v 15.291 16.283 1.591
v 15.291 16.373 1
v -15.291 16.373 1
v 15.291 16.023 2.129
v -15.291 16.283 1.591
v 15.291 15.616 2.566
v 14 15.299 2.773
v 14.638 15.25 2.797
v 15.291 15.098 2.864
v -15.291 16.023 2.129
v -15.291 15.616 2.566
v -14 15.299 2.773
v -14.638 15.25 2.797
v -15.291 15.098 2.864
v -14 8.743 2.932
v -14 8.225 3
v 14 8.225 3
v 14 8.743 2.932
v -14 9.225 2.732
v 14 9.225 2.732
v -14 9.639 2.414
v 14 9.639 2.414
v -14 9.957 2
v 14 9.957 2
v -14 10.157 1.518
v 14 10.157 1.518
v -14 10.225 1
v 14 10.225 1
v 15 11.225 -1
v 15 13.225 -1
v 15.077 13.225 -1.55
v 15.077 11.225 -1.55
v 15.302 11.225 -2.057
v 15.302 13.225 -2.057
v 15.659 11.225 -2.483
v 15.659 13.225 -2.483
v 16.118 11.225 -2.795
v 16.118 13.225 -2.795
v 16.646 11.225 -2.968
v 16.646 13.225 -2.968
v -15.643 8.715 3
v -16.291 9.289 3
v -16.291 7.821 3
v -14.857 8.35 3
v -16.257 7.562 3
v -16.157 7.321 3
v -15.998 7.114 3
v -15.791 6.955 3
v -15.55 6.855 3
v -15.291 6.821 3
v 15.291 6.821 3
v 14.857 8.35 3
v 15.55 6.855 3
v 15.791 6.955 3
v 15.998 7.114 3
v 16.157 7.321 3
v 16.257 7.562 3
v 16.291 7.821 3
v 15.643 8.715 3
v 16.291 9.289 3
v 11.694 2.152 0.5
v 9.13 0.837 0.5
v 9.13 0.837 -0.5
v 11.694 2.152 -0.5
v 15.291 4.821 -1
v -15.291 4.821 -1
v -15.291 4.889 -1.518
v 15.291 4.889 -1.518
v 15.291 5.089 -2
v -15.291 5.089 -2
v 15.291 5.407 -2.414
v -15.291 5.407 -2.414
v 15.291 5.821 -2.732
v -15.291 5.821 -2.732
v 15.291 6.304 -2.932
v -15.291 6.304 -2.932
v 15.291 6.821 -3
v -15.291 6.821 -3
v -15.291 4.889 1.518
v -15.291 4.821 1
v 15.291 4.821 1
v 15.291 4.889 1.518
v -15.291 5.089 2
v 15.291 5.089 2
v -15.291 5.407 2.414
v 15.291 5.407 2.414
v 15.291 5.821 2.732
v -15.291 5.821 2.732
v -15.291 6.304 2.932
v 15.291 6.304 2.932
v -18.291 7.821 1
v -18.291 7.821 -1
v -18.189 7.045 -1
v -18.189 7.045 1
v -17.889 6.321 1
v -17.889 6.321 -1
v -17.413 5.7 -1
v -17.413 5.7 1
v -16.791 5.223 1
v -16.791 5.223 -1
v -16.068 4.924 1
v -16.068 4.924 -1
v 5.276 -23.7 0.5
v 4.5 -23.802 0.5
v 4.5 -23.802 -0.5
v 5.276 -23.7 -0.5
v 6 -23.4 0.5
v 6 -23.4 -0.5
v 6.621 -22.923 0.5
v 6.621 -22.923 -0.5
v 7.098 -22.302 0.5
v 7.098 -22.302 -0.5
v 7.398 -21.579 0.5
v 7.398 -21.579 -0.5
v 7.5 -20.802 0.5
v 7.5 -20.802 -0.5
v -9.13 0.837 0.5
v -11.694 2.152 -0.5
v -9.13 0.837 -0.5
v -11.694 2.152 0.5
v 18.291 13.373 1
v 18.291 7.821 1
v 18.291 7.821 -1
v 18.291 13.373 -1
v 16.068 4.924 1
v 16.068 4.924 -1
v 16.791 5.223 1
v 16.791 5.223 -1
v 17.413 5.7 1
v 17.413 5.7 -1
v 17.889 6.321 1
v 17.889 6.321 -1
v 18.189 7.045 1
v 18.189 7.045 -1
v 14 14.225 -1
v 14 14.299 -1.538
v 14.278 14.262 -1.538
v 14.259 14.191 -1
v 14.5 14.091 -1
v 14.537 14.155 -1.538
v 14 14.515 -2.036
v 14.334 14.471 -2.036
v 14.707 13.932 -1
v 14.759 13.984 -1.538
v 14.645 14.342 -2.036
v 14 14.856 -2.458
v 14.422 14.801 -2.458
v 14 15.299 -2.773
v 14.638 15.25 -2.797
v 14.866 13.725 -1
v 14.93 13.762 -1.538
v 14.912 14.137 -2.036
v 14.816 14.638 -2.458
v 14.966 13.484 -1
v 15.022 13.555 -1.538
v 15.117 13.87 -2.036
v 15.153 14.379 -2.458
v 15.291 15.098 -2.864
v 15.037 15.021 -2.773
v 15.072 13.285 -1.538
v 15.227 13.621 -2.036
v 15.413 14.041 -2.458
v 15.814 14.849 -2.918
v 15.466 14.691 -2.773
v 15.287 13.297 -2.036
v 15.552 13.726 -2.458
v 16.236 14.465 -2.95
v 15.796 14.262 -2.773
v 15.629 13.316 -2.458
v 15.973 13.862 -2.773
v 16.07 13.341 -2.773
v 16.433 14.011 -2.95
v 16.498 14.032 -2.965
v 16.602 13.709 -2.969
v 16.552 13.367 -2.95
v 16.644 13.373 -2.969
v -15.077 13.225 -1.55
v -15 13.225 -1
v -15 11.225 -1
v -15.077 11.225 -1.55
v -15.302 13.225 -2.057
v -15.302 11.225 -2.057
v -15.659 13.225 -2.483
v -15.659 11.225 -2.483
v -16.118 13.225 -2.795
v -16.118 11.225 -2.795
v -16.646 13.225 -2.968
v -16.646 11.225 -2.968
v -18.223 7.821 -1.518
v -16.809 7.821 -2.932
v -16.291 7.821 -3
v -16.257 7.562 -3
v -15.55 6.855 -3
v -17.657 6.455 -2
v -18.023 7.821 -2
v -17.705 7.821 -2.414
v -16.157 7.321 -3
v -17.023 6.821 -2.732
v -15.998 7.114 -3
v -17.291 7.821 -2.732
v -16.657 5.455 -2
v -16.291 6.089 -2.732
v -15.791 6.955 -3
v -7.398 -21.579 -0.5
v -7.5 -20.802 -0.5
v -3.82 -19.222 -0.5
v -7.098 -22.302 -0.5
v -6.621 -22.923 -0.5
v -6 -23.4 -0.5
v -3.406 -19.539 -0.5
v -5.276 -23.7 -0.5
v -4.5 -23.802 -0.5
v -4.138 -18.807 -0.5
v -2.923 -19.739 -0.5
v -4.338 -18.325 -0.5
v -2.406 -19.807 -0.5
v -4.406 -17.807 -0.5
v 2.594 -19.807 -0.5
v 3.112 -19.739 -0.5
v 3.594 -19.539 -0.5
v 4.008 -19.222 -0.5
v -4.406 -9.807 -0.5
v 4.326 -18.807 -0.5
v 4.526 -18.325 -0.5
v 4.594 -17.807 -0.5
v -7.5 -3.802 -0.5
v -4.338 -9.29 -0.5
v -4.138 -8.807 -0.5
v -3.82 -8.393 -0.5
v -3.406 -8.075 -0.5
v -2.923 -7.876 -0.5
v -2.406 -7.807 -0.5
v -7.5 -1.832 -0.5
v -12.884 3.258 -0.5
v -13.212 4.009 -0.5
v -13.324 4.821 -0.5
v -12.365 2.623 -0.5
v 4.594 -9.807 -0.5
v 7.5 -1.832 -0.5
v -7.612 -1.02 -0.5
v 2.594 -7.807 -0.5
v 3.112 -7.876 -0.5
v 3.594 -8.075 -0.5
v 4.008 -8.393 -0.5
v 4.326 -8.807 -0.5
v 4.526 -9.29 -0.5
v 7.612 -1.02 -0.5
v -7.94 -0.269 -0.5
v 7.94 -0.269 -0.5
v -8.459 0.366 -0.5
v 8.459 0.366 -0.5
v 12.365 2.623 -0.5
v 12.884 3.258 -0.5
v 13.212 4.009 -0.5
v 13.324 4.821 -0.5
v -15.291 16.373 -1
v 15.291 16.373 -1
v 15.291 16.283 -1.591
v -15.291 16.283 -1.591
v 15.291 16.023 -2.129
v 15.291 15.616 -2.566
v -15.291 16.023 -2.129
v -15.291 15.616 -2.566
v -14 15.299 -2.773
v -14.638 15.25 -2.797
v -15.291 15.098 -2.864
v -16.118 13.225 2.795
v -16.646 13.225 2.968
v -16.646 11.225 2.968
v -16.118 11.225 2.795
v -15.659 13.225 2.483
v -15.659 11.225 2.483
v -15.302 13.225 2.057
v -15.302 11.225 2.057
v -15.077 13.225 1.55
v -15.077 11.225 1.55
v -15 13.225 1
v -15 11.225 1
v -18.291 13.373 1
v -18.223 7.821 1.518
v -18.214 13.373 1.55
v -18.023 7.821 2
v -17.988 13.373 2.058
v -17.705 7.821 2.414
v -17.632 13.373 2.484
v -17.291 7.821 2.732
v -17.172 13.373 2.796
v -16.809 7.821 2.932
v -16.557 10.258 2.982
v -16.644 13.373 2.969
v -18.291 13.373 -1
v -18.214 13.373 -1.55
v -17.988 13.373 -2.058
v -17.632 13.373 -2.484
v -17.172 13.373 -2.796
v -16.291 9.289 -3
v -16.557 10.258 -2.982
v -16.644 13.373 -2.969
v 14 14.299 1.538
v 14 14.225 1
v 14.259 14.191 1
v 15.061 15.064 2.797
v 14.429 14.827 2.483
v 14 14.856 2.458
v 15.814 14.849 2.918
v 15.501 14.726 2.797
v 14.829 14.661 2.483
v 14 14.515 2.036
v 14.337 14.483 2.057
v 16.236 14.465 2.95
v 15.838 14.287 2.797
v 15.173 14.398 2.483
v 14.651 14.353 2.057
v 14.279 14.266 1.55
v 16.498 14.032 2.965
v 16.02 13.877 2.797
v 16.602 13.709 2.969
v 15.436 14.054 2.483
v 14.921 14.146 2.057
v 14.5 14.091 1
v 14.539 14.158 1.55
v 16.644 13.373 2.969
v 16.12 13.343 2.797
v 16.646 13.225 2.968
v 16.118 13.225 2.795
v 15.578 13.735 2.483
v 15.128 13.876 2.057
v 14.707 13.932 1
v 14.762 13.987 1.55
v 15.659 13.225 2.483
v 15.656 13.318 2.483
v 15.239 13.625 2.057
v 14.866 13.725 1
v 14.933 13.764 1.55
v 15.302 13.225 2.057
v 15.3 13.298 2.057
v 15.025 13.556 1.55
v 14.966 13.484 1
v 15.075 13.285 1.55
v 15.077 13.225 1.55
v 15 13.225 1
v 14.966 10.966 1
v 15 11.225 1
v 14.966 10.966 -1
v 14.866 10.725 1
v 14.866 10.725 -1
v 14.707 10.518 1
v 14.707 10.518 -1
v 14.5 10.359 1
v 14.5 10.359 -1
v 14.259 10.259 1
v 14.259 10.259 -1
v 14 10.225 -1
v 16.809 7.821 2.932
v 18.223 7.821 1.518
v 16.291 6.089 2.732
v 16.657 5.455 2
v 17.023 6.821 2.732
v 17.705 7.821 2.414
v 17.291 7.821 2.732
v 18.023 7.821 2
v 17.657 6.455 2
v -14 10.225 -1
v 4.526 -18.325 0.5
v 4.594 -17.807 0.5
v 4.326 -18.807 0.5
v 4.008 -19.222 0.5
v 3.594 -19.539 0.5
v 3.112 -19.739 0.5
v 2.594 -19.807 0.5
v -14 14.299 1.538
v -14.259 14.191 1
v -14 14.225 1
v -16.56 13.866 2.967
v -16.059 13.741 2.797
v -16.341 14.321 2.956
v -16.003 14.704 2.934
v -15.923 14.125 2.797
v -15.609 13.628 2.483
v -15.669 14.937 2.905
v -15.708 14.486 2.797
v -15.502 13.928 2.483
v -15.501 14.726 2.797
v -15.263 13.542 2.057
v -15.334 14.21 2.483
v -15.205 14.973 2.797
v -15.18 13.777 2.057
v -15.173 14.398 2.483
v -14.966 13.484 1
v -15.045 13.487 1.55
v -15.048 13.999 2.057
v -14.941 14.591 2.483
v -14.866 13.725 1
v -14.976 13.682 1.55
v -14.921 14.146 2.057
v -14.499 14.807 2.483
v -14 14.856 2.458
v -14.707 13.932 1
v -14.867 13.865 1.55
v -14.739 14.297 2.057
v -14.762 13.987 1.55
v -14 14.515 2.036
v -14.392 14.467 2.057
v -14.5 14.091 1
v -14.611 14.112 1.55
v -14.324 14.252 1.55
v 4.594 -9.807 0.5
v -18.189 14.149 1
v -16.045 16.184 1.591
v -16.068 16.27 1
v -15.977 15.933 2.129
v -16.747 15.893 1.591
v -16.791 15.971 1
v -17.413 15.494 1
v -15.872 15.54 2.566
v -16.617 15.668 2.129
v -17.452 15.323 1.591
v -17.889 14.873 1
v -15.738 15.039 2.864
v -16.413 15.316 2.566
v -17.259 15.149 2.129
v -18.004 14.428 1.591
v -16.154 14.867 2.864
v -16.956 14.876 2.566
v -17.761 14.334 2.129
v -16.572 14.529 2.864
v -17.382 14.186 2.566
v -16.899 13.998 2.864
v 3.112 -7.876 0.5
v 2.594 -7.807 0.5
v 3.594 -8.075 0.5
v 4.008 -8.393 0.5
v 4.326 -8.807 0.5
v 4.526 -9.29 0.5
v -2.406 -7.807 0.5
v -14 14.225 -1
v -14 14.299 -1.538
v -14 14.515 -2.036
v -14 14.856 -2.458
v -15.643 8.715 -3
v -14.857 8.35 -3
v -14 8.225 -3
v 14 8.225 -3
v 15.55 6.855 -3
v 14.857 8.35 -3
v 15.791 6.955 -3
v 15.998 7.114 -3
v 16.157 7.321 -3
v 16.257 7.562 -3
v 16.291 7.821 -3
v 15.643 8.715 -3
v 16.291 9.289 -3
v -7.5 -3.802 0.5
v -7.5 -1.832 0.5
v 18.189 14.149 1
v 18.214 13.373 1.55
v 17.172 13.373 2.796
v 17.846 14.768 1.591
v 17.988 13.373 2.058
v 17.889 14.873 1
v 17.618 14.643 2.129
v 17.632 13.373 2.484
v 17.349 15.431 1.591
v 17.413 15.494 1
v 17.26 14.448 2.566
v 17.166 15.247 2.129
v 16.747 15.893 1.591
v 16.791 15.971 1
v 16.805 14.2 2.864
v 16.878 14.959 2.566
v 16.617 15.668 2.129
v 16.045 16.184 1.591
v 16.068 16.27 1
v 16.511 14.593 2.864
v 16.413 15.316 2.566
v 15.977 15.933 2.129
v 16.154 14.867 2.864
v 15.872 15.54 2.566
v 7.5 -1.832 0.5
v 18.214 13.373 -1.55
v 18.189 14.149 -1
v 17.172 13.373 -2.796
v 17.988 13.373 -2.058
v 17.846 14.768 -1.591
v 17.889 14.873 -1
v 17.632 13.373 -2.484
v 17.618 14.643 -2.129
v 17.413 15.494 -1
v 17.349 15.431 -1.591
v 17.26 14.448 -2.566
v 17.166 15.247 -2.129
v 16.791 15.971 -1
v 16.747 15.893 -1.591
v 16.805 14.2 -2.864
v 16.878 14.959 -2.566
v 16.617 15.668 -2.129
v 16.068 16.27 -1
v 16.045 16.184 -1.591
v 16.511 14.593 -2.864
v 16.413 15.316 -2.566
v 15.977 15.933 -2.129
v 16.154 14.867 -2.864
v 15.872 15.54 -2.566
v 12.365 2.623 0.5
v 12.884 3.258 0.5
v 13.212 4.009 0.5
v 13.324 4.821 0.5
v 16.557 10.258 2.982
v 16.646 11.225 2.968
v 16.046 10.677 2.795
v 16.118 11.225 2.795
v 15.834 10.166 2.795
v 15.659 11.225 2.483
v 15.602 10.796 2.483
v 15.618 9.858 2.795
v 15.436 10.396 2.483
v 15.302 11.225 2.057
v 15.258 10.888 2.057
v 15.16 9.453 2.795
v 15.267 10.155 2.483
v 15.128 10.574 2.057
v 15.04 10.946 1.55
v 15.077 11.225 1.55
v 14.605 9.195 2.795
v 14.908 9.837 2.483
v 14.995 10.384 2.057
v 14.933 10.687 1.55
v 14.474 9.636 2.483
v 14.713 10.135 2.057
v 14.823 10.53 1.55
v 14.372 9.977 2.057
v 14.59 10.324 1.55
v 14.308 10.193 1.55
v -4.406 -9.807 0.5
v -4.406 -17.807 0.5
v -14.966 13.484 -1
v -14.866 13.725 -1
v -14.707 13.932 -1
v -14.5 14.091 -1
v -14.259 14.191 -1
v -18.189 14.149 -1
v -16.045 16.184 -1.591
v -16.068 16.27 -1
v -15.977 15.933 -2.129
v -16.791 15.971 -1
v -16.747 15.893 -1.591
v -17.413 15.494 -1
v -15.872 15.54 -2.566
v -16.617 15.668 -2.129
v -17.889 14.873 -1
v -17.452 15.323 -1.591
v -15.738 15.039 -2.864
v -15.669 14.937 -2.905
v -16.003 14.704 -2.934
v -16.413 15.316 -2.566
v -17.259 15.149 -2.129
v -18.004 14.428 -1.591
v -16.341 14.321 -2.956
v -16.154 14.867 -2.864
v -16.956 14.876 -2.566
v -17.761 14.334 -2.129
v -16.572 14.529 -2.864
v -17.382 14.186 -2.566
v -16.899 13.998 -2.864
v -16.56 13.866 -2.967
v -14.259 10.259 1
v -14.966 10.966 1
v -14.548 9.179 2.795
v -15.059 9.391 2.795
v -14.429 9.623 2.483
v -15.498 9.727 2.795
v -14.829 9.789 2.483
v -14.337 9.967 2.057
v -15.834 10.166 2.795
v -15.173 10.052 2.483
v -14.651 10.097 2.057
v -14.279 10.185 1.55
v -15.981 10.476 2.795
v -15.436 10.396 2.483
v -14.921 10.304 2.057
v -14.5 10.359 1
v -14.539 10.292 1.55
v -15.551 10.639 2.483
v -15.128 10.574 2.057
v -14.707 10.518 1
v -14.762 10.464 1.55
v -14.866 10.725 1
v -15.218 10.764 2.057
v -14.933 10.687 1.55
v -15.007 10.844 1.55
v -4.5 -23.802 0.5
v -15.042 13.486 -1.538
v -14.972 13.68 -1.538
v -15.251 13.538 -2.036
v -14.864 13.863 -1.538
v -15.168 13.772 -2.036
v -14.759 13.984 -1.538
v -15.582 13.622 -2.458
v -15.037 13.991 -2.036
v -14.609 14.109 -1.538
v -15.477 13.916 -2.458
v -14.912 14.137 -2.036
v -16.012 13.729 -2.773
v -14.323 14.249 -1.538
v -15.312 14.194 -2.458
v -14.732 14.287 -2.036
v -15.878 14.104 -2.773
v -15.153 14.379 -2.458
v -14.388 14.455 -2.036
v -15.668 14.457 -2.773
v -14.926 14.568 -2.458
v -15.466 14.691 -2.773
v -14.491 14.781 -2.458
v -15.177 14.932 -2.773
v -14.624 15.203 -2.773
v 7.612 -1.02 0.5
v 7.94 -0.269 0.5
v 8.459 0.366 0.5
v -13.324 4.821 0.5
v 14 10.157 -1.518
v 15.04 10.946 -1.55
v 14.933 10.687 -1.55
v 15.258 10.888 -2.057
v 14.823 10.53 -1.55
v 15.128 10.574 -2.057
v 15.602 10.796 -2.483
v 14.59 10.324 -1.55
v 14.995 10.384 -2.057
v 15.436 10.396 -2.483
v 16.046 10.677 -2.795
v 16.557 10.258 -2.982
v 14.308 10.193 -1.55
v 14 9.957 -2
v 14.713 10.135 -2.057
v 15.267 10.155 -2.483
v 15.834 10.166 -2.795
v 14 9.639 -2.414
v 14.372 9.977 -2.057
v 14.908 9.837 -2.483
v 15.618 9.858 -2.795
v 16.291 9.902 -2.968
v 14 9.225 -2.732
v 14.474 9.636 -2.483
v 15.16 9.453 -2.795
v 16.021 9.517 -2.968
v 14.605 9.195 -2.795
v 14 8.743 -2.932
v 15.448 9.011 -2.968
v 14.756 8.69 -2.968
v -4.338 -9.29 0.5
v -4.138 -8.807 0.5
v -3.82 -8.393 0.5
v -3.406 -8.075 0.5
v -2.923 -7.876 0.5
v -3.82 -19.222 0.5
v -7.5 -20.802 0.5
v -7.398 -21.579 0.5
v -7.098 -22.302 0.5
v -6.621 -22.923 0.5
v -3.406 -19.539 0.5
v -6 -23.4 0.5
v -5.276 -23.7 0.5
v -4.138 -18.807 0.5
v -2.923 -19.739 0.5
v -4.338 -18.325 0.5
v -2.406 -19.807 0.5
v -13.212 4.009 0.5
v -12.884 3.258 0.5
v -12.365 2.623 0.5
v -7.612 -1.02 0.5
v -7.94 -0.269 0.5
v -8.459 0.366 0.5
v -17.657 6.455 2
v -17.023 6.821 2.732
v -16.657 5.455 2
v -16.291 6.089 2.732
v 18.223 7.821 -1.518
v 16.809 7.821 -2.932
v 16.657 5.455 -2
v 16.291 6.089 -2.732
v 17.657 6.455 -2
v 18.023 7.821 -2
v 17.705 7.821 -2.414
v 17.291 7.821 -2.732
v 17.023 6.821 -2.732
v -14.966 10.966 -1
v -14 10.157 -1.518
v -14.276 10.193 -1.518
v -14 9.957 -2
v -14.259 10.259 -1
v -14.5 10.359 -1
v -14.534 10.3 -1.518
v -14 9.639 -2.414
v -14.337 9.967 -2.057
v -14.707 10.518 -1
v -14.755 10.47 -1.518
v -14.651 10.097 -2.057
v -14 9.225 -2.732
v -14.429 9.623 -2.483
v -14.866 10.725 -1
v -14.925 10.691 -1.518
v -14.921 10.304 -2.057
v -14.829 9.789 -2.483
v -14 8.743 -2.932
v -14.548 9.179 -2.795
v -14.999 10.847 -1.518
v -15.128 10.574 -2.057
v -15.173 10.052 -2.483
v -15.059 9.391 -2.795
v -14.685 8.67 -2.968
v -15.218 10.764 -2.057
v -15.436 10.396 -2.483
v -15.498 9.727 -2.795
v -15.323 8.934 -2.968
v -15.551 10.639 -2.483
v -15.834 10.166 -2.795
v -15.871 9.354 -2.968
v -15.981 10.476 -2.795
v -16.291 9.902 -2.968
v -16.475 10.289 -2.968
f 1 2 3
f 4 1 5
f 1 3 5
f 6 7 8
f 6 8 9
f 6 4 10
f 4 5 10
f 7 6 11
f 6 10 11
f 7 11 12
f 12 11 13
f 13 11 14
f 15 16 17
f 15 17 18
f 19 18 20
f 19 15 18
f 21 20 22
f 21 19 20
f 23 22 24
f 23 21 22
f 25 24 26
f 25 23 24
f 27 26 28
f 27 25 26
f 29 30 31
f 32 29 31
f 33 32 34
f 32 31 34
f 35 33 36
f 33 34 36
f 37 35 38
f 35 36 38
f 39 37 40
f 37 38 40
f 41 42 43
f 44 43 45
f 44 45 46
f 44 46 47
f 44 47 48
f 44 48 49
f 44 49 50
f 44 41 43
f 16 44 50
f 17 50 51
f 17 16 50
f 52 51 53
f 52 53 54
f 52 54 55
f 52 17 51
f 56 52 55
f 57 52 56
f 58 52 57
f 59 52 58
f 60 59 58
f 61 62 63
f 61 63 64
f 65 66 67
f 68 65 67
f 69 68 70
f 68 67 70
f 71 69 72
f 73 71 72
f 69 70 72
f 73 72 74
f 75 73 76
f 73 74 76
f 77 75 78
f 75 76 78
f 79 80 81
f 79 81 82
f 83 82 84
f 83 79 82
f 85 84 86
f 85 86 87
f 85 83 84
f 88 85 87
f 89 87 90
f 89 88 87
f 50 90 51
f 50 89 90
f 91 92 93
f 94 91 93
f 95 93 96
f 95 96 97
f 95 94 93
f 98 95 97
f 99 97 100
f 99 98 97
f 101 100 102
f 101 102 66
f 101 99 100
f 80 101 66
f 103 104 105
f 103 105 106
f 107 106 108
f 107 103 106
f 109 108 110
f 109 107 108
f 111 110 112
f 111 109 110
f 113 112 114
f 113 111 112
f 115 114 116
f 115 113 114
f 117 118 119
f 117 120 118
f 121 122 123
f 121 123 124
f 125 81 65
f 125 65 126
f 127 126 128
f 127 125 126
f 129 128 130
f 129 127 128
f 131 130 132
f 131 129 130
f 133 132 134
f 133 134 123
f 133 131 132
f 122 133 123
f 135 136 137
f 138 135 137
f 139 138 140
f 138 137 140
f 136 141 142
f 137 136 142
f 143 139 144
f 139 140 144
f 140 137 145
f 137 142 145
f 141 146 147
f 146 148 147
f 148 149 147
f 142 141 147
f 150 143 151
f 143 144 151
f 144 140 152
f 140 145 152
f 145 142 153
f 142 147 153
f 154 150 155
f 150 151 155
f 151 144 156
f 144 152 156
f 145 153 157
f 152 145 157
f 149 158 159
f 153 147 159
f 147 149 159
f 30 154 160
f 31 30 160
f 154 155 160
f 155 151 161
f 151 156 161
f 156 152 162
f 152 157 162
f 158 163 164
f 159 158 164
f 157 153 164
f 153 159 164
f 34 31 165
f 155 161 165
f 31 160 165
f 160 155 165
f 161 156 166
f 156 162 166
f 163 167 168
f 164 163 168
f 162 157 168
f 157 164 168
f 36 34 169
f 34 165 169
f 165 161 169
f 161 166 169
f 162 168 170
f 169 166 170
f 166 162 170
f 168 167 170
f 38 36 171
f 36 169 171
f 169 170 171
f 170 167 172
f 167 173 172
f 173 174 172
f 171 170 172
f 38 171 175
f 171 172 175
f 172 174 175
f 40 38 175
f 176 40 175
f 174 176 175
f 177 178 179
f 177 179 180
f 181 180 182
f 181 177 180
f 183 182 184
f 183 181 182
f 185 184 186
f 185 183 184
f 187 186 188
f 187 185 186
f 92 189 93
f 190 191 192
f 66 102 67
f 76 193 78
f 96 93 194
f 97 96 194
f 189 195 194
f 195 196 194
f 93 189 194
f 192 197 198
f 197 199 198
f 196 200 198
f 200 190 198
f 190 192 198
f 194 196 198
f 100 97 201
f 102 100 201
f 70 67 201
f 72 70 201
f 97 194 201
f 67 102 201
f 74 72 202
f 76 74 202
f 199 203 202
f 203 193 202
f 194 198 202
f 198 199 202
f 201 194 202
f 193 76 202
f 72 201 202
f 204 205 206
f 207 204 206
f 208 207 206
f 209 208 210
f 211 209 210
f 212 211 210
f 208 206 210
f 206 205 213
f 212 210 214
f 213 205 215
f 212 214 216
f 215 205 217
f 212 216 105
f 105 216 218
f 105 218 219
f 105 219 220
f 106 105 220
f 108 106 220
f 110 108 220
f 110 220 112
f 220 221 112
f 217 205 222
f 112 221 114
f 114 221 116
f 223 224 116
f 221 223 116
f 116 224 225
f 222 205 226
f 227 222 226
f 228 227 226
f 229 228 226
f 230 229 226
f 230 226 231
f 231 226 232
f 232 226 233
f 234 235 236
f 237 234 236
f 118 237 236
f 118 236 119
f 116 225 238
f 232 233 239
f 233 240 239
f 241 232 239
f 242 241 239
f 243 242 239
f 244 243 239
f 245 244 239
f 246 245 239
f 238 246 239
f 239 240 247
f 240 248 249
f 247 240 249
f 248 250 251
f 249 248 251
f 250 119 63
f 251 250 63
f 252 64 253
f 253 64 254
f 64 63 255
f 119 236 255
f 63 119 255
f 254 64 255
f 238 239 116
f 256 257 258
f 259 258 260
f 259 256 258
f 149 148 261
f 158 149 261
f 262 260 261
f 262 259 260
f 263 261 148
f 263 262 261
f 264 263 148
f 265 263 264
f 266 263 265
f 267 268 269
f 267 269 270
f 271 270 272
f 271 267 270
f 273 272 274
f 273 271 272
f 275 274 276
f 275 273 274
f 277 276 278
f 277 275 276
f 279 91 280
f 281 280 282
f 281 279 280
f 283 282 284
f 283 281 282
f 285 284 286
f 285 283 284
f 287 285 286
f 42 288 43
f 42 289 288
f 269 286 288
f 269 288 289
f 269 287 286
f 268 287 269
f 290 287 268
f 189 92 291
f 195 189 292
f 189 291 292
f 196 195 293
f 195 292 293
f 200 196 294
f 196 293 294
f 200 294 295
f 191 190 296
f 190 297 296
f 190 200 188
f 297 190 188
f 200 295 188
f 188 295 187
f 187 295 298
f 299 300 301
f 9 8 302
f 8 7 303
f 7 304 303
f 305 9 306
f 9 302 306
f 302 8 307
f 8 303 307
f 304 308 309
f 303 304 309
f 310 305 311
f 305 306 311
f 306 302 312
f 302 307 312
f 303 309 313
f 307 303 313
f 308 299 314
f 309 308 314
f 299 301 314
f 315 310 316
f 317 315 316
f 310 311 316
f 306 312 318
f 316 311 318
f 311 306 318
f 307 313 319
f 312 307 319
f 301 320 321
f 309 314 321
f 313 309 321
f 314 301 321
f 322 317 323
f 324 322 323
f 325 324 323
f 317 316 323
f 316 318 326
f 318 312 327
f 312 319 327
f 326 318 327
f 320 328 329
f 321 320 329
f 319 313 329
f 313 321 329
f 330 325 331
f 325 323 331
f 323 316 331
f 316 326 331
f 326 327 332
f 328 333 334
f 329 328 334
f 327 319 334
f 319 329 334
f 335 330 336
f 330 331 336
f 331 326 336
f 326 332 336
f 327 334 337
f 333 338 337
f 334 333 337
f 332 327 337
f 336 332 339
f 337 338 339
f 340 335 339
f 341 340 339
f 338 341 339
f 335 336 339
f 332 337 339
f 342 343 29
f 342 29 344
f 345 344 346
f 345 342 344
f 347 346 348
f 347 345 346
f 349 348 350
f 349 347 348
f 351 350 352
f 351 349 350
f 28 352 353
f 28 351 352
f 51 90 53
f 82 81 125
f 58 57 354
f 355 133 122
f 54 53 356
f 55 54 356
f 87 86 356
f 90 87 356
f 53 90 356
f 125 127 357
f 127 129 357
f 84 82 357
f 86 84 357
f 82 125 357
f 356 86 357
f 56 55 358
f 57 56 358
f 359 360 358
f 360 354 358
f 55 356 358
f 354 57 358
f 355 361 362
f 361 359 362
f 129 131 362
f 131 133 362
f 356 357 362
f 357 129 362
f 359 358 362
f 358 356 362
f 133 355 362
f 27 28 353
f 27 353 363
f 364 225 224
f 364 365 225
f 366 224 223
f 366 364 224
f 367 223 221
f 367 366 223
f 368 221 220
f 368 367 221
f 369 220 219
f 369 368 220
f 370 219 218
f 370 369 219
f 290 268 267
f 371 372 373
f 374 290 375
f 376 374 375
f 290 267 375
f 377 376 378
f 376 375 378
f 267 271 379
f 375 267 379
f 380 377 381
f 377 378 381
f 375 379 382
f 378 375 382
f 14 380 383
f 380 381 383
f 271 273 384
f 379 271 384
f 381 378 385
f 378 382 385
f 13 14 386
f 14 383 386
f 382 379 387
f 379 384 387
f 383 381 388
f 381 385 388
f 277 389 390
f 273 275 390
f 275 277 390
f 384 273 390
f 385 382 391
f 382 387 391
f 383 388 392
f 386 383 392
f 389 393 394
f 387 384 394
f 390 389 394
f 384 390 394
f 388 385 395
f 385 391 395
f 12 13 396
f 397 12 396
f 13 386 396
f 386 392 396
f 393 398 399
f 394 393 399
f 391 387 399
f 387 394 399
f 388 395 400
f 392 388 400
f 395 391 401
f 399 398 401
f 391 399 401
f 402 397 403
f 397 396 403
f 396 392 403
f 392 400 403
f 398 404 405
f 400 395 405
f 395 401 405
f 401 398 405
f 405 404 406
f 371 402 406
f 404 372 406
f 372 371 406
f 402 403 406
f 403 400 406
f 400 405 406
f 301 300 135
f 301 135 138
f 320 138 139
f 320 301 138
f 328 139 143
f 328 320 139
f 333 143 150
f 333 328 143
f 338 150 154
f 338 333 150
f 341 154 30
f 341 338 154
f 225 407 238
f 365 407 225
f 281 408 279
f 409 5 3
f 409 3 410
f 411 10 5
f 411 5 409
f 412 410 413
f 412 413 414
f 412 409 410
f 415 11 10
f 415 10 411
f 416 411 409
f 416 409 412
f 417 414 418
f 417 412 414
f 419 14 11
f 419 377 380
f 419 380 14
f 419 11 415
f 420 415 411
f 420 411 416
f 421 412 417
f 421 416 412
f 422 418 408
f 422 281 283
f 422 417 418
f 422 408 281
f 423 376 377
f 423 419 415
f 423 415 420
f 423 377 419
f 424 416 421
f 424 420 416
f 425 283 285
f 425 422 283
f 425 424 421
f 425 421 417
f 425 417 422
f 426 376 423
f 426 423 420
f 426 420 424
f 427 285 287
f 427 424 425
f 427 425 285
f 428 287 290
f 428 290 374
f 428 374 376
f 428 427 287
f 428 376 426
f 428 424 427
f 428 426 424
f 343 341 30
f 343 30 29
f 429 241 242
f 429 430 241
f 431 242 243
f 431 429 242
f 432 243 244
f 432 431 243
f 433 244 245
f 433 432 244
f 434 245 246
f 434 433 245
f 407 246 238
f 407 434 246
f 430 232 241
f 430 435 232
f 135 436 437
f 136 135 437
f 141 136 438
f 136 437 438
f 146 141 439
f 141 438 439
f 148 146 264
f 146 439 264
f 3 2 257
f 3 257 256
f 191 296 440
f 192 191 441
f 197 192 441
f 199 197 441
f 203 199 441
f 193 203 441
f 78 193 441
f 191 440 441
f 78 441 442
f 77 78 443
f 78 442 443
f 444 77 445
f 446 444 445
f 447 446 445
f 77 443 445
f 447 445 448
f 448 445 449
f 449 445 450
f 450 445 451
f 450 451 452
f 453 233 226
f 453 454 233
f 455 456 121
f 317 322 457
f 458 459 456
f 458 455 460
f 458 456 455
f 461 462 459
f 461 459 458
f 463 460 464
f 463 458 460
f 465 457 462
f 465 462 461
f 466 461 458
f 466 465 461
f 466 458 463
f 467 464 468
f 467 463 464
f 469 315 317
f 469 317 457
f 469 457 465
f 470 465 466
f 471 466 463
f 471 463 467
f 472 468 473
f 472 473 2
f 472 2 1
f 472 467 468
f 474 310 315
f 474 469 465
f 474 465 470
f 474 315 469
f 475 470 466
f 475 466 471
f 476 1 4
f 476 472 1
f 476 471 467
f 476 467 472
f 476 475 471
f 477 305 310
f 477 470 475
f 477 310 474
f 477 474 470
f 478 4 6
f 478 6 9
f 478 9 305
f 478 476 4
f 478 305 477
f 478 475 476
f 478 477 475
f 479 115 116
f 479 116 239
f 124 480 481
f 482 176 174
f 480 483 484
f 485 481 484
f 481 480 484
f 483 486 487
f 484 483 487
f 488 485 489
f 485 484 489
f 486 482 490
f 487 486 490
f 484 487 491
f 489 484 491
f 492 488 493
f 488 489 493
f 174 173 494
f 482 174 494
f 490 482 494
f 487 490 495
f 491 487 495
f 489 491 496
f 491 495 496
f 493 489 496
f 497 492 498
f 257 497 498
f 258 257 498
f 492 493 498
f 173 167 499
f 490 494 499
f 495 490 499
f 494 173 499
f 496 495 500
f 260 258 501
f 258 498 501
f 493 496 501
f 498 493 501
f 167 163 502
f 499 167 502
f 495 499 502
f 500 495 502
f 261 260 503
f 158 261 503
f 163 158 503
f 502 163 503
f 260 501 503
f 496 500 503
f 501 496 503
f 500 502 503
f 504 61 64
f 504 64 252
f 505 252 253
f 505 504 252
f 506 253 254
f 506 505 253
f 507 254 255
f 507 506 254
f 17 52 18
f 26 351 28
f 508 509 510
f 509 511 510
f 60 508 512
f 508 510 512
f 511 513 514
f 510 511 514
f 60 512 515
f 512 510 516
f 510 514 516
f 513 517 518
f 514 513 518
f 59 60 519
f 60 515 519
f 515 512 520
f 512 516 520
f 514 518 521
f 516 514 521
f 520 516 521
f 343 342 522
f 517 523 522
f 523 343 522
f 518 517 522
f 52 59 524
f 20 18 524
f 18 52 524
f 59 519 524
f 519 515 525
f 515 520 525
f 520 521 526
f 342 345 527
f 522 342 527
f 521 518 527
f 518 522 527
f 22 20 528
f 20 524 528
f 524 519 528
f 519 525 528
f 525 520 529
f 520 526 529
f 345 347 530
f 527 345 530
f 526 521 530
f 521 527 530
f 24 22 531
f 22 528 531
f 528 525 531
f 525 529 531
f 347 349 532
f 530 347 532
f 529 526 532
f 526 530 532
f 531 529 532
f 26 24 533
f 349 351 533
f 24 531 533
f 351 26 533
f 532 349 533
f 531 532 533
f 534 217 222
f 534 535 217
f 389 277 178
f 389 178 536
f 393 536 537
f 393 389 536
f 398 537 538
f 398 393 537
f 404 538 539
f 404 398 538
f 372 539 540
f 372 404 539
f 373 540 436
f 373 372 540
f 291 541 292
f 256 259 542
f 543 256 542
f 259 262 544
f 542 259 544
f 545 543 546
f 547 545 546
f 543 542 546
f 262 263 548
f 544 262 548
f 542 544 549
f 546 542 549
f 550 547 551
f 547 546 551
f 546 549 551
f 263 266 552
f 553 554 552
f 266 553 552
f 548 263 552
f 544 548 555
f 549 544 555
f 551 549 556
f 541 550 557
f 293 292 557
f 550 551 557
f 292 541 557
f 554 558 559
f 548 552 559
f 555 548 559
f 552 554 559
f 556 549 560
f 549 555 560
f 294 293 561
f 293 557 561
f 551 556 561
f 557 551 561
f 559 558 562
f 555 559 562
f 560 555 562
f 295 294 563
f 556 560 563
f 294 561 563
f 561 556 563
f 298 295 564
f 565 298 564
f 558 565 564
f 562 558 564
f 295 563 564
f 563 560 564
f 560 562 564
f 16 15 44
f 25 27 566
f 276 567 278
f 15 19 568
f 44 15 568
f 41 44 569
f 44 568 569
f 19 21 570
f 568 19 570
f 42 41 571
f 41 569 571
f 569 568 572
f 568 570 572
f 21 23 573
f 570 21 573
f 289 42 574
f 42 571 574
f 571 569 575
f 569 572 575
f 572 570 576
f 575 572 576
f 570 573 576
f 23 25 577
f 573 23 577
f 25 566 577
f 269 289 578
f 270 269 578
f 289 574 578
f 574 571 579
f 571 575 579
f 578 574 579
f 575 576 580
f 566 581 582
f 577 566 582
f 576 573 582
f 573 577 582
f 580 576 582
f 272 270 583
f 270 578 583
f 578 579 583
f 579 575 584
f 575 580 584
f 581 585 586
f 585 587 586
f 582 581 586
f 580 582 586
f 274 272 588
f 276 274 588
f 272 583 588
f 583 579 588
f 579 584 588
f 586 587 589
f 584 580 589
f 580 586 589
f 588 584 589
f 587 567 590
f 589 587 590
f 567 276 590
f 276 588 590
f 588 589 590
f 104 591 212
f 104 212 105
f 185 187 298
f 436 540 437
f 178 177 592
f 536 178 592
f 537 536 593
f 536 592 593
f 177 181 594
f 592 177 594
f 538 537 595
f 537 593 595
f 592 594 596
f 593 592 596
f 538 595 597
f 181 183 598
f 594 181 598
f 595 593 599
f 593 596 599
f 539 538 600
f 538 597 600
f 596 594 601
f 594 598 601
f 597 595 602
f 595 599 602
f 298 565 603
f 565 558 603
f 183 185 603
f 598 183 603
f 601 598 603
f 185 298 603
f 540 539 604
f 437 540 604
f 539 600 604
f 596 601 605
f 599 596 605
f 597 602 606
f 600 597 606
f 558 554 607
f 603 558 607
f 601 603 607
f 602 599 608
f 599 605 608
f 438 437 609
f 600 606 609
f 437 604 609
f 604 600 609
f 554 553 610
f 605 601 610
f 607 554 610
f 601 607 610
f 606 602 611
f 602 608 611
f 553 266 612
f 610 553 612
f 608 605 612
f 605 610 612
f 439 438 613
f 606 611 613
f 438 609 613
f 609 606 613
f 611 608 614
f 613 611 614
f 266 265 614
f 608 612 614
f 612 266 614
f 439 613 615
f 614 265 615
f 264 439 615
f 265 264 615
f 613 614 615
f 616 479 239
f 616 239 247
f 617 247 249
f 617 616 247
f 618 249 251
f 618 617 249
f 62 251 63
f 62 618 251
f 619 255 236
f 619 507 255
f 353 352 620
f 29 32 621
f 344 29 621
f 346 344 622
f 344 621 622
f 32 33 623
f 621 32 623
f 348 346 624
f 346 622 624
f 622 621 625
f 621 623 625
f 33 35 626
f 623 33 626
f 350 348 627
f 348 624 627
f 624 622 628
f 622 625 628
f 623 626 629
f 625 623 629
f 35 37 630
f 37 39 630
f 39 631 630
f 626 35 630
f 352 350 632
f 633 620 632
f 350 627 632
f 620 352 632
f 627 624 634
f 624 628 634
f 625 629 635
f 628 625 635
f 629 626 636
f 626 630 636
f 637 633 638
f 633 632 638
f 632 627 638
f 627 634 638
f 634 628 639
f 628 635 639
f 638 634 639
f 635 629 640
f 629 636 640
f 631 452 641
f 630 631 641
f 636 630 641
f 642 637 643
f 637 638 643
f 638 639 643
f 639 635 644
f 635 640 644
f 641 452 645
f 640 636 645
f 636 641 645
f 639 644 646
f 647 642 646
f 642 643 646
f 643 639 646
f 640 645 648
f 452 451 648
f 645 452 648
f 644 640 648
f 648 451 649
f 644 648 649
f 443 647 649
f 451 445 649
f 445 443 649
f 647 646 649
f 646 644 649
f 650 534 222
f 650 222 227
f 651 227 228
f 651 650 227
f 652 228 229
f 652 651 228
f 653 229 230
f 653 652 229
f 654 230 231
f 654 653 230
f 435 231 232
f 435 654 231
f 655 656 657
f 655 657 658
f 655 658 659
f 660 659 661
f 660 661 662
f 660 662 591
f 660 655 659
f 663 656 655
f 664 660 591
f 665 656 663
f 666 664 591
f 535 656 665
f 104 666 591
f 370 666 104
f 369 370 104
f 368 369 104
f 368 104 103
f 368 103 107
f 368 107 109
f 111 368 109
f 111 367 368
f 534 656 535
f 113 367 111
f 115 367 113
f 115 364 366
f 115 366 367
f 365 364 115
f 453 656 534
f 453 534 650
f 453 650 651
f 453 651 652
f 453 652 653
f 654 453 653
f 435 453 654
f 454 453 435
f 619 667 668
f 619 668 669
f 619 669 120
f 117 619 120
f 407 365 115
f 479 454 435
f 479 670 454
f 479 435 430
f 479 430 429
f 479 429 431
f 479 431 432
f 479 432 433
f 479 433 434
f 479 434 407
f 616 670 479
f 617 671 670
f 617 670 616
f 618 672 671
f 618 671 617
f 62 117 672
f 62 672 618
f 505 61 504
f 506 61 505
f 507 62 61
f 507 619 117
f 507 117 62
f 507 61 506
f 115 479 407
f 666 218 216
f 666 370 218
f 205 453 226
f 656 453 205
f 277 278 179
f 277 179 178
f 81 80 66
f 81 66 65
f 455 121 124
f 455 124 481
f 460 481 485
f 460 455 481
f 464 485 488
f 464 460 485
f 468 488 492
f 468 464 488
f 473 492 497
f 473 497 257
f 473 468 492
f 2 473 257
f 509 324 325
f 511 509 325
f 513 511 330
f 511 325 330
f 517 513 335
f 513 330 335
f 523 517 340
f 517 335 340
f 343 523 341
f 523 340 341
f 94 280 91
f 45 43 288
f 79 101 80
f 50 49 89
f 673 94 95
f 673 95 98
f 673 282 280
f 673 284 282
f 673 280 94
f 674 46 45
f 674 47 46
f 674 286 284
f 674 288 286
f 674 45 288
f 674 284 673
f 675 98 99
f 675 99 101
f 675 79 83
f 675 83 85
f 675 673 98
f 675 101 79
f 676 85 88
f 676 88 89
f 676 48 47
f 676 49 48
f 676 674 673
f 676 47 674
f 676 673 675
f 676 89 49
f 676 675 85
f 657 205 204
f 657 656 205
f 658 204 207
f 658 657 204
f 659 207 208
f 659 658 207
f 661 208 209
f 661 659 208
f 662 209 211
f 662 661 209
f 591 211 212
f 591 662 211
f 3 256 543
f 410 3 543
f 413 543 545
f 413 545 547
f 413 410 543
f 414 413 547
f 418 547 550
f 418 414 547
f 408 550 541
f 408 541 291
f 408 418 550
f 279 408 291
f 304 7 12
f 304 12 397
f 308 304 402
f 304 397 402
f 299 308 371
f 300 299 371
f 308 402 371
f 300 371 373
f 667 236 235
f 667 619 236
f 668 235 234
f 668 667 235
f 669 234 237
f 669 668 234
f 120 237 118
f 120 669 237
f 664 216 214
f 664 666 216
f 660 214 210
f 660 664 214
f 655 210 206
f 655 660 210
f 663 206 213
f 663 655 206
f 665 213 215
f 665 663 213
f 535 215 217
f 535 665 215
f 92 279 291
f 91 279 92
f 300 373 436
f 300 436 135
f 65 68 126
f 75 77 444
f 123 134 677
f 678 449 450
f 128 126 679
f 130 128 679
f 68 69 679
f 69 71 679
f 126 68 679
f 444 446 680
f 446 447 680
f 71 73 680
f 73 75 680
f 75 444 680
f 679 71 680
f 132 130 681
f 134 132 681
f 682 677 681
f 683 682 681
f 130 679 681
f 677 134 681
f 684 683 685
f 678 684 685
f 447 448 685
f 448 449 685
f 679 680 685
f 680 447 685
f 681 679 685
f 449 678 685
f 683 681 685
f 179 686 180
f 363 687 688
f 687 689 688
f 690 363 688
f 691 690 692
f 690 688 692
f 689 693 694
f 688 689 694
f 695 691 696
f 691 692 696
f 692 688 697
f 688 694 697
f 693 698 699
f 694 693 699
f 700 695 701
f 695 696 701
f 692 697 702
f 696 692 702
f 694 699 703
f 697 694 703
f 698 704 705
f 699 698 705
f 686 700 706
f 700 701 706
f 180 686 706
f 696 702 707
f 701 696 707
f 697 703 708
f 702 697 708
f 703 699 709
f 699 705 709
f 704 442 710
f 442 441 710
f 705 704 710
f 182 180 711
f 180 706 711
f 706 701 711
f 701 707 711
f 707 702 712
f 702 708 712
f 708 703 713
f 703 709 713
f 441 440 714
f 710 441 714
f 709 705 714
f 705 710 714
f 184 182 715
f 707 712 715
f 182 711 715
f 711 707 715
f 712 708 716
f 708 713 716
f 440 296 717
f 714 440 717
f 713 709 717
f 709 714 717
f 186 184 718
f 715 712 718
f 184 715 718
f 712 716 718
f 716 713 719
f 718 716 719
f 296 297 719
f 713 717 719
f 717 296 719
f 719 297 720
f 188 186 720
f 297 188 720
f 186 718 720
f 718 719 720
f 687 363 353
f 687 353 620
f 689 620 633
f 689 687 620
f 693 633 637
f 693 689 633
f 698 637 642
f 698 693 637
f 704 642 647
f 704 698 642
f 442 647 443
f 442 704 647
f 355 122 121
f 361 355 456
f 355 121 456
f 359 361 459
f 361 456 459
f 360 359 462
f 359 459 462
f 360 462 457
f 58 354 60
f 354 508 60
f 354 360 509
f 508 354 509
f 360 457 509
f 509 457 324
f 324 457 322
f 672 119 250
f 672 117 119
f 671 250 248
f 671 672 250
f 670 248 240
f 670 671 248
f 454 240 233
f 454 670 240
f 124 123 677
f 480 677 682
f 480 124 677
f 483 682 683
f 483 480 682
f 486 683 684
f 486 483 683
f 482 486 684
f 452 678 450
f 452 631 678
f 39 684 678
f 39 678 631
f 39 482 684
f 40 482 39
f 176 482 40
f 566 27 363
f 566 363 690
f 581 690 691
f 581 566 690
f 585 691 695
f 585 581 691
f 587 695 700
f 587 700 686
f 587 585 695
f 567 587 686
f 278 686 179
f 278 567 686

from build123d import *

# Parameters (mm, degrees)
F1_DEPTH     = 0.5
F2_DEPTH     = 3
F3_T1_DEPTH  = 30.5823954344
F3_T3_DEPTH  = 28
F3_T5_DEPTH  = 2
F3_T7_DEPTH  = 5.5512716671
F3_T10_ANGLE = 90
F3_T12_ANGLE = 90
F3_T14_ANGLE = 90
F3_T16_ANGLE = 90
F3_T18_ANGLE = 90
F3_T20_ANGLE = 90
F3_T22_ANGLE = 90
F3_T24_ANGLE = 90
F3_T26_ANGLE = 90
F3_T28_ANGLE = 90
F3_T30_ANGLE = 90
F3_T32_ANGLE = 90
F3_T34_ANGLE = 90
F3_T36_ANGLE = 90
F3_T38_ANGLE = 90
F3_T40_ANGLE = 90


# Not quite as in the source:
# - a fillet or chamfer that OpenCascade refuses, or shapes differently, is made with other operations: its cross-section is extruded or revolved along the edge and cut away or added
# - ends of sketch curves that miss each other by under 0.0002 mm in the source are joined


with BuildPart() as f1:
    # F0 (on Top) → F1 (new body, symmetric)
    with BuildSketch(Plane.XY):
        with BuildLine():
            ThreePointArc((-7.5000009313, -20.8021384721), (-6.6213212749, -22.9234588157), (-4.5000009313, -23.8021384721))
            Line((-4.5000009313, -23.8021384721), (4.4999990687, -23.8021384721))
            ThreePointArc((4.4999990687, -23.8021384721), (6.6213194122, -22.9234588157), (7.4999990687, -20.8021384721))
            Line((7.4999990687, -20.8021384721), (7.4999990687, -3.8021384721))
            Line((7.4999990687, -3.8021384721), (7.4999990687, -1.8323950848))
            ThreePointArc((7.4999990687, -1.8323950848), (7.9397973668, -0.2686280799), (9.1302438991, 0.8366442134))
            Line((9.1302438991, 0.8366442134), (11.6938184408, 2.1522747039))
            ThreePointArc((11.6938184408, 2.1522747039), (12.8842649732, 3.2575469972), (13.3240632713, 4.8213140021))
            Line((13.3240632713, 4.8213140021), (0, 4.8213140021))
            Line((0, 4.8213140021), (-13.3240632713, 4.8213140021))
            ThreePointArc((-13.3240632713, 4.8213140021), (-12.8842649732, 3.2575469972), (-11.6938184408, 2.1522747039))
            Line((-11.6938184408, 2.1522747039), (-9.1302438991, 0.8366442134))
            ThreePointArc((-9.1302438991, 0.8366442134), (-7.9397973668, -0.2686280799), (-7.4999990687, -1.8323950848))
            Line((-7.4999990687, -1.8323950848), (-7.4999990687, -3.8021384721))
            Line((-7.4999990687, -3.8021384721), (-7.5000009313, -20.8021384721))
        make_face()
        with BuildLine():
            ThreePointArc((-4.4058463536, -9.8073738366), (-3.820059916, -8.3931602743), (-2.4058463536, -7.8073738366))
            Line((-2.4058463536, -7.8073738366), (2.5941536464, -7.8073738366))
            ThreePointArc((2.5941536464, -7.8073738366), (4.0083672088, -8.3931602743), (4.5941536464, -9.8073738366))
            Line((4.5941536464, -9.8073738366), (4.5941536464, -17.8073738366))
            ThreePointArc((4.5941536464, -17.8073738366), (4.0083672088, -19.221587399), (2.5941536464, -19.8073738366))
            Line((2.5941536464, -19.8073738366), (-2.4058463536, -19.8073738366))
            ThreePointArc((-2.4058463536, -19.8073738366), (-3.820059916, -19.221587399), (-4.4058463536, -17.8073738366))
            Line((-4.4058463536, -17.8073738366), (-4.4058463536, -9.8073738366))
        make_face(mode=Mode.SUBTRACT)
    extrude(amount=F1_DEPTH, both=True)


with BuildPart() as f2:
    # F0 (on Top) → F2 (new body, symmetric)
    with BuildSketch(Plane.XY):
        with BuildLine():
            Line((-15.2911977172, 4.8213140021), (-13.3240632713, 4.8213140021))
            Line((-13.3240632713, 4.8213140021), (0, 4.8213140021))
            Line((0, 4.8213140021), (0, 10.225163497))
            Line((0, 10.225163497), (-14, 10.225163497))
            ThreePointArc((-14, 10.225163497), (-14.7071067812, 10.5180567158), (-15, 11.225163497))
            Line((-15, 11.225163497), (-15, 13.225163497))
            ThreePointArc((-15, 13.225163497), (-14.7071067812, 13.9322702782), (-14, 14.225163497))
            Line((-14, 14.225163497), (0, 14.225163497))
            Line((0, 14.225163497), (0, 16.3725856692))
            Line((0, 16.3725856692), (-15.2911977172, 16.3725856692))
            ThreePointArc((-15.2911977172, 16.3725856692), (-17.4125180607, 15.4939060127), (-18.2911977172, 13.3725856692))
            Line((-18.2911977172, 13.3725856692), (-18.2911977172, 7.8213140021))
            ThreePointArc((-18.2911977172, 7.8213140021), (-17.4125180607, 5.6999936585), (-15.2911977172, 4.8213140021))
        make_face()
        with BuildLine():
            Line((0, 4.8213140021), (13.3240632713, 4.8213140021))
            Line((13.3240632713, 4.8213140021), (15.2911977172, 4.8213140021))
            ThreePointArc((15.2911977172, 4.8213140021), (17.4125180607, 5.6999936585), (18.2911977172, 7.8213140021))
            Line((18.2911977172, 7.8213140021), (18.2911977172, 13.3725856692))
            ThreePointArc((18.2911977172, 13.3725856692), (17.4125180607, 15.4939060127), (15.2911977172, 16.3725856692))
            Line((15.2911977172, 16.3725856692), (0, 16.3725856692))
            Line((0, 16.3725856692), (0, 14.225163497))
            Line((0, 14.225163497), (14, 14.225163497))
            ThreePointArc((14, 14.225163497), (14.7071067812, 13.9322702782), (15, 13.225163497))
            Line((15, 13.225163497), (15, 11.225163497))
            ThreePointArc((15, 11.225163497), (14.7071067812, 10.5180567158), (14, 10.225163497))
            Line((14, 10.225163497), (0, 10.225163497))
            Line((0, 10.225163497), (0, 4.8213140021))
        make_face()
    extrude(amount=F2_DEPTH, both=True)

    # F3: fillet of radius 2 on 4 edges, made by hand

    # F3_s2 → F3_t1 (cut)
    with BuildSketch(Plane.YZ.offset(-15.2911977172)):
        with BuildLine():
            ThreePointArc((4.8213140021, 1), (5.4071004397, 2.4142135624), (6.8213140021, 3))
            Line((6.8213140021, 3), (4.8213140021, 3))
            Line((4.8213140021, 3), (4.8213140021, 1))
        make_face()
        with BuildLine():
            ThreePointArc((4.8213140021, -1), (5.4071004397, -2.4142135624), (6.8213140021, -3))
            Line((6.8213140021, -3), (4.8213140021, -3))
            Line((4.8213140021, -3), (4.8213140021, -1))
        make_face()
        with BuildLine():
            ThreePointArc((16.3725856692, -1), (15.7867992315, -2.4142135624), (14.3725856692, -3))
            Line((14.3725856692, -3), (16.3725856692, -3))
            Line((16.3725856692, -3), (16.3725856692, -1))
        make_face()
        with BuildLine():
            ThreePointArc((16.3725856692, 1), (15.7867992315, 2.4142135624), (14.3725856692, 3))
            Line((14.3725856692, 3), (16.3725856692, 3))
            Line((16.3725856692, 3), (16.3725856692, 1))
        make_face()
    extrude(amount=F3_T1_DEPTH, mode=Mode.SUBTRACT)

    # F3_s4 → F3_t3 (cut)
    with BuildSketch(Plane.YZ.offset(-14)):
        with BuildLine():
            ThreePointArc((16.225163497, 3), (14.8109499347, 2.4142135624), (14.225163497, 1))
            Line((14.225163497, 1), (14.225163497, 3))
            Line((14.225163497, 3), (16.225163497, 3))
        make_face()
        with BuildLine():
            ThreePointArc((14.225163497, -1), (14.8109499347, -2.4142135624), (16.225163497, -3))
            Line((16.225163497, -3), (14.225163497, -3))
            Line((14.225163497, -3), (14.225163497, -1))
        make_face()
        with BuildLine():
            ThreePointArc((10.225163497, -1), (9.6393770594, -2.4142135624), (8.225163497, -3))
            Line((8.225163497, -3), (10.225163497, -3))
            Line((10.225163497, -3), (10.225163497, -1))
        make_face()
        with BuildLine():
            ThreePointArc((8.225163497, 3), (9.6393770594, 2.4142135624), (10.225163497, 1))
            Line((10.225163497, 1), (10.225163497, 3))
            Line((10.225163497, 3), (8.225163497, 3))
        make_face()
    extrude(amount=F3_T3_DEPTH, mode=Mode.SUBTRACT)

    # F3_s6 → F3_t5 (cut)
    with BuildSketch(Plane.XZ.offset(-13.225163497)):
        with BuildLine():
            ThreePointArc((15, -1), (15.5857864376, -2.4142135624), (17, -3))
            Line((17, -3), (15, -3))
            Line((15, -3), (15, -1))
        make_face()
        with BuildLine():
            ThreePointArc((-15, -1), (-15.5857864376, -2.4142135624), (-17, -3))
            Line((-17, -3), (-15, -3))
            Line((-15, -3), (-15, -1))
        make_face()
        with BuildLine():
            ThreePointArc((17, 3), (15.5857864376, 2.4142135624), (15, 1))
            Line((15, 1), (15, 3))
            Line((15, 3), (17, 3))
        make_face()
        with BuildLine():
            ThreePointArc((-17, 3), (-15.5857864376, 2.4142135624), (-15, 1))
            Line((-15, 1), (-15, 3))
            Line((-15, 3), (-17, 3))
        make_face()
    extrude(amount=F3_T5_DEPTH, mode=Mode.SUBTRACT)

    # F3_s8 → F3_t7 (cut)
    with BuildSketch(Plane.XZ.offset(-13.3725856692)):
        with BuildLine():
            ThreePointArc((18.2911977172, -1), (17.7054112796, -2.4142135624), (16.2911977172, -3))
            Line((16.2911977172, -3), (18.2911977172, -3))
            Line((18.2911977172, -3), (18.2911977172, -1))
        make_face()
        with BuildLine():
            ThreePointArc((-18.2911977172, -1), (-17.7054112796, -2.4142135624), (-16.2911977172, -3))
            Line((-16.2911977172, -3), (-18.2911977172, -3))
            Line((-18.2911977172, -3), (-18.2911977172, -1))
        make_face()
        with BuildLine():
            ThreePointArc((18.2911977172, 1), (17.7054112796, 2.4142135624), (16.2911977172, 3))
            Line((16.2911977172, 3), (18.2911977172, 3))
            Line((18.2911977172, 3), (18.2911977172, 1))
        make_face()
        with BuildLine():
            ThreePointArc((-18.2911977172, 1), (-17.7054112796, 2.4142135624), (-16.2911977172, 3))
            Line((-16.2911977172, 3), (-18.2911977172, 3))
            Line((-18.2911977172, 3), (-18.2911977172, 1))
        make_face()
    extrude(amount=F3_T7_DEPTH, mode=Mode.SUBTRACT)

    # F3_s9 → F3_t10 (revolve, cut)
    with BuildSketch(Plane.XZ.offset(-13.225163497)):
        with BuildLine():
            ThreePointArc((-15, -1), (-15.5857864376, -2.4142135624), (-17, -3))
            Line((-17, -3), (-15, -3))
            Line((-15, -3), (-15, -1))
        make_face()
    revolve(axis=Axis((-14, 13.225163497, -3), (0, 0, -1)), revolution_arc=F3_T10_ANGLE, mode=Mode.SUBTRACT)

    # F3_s11 → F3_t12 (revolve, cut)
    with BuildSketch(Plane.YZ.offset(14)):
        with BuildLine():
            ThreePointArc((14.225163497, -1), (14.8109499347, -2.4142135624), (16.225163497, -3))
            Line((16.225163497, -3), (14.225163497, -3))
            Line((14.225163497, -3), (14.225163497, -1))
        make_face()
    revolve(axis=Axis((14, 13.225163497, -3), (0, 0, -1)), revolution_arc=F3_T12_ANGLE, mode=Mode.SUBTRACT)

    # F3_s13 → F3_t14 (revolve, cut)
    with BuildSketch(Plane.XZ.offset(-11.225163497)):
        with BuildLine():
            ThreePointArc((15, -1), (15.5857864376, -2.4142135624), (17, -3))
            Line((17, -3), (15, -3))
            Line((15, -3), (15, -1))
        make_face()
    revolve(axis=Axis((14, 11.225163497, -3), (0, 0, -1)), revolution_arc=F3_T14_ANGLE, mode=Mode.SUBTRACT)

    # F3_s15 → F3_t16 (revolve, cut)
    with BuildSketch(Plane.YZ.offset(-14)):
        with BuildLine():
            ThreePointArc((10.225163497, -1), (9.6393770594, -2.4142135624), (8.225163497, -3))
            Line((8.225163497, -3), (10.225163497, -3))
            Line((10.225163497, -3), (10.225163497, -1))
        make_face()
    revolve(axis=Axis((-14, 11.225163497, -3), (0, 0, -1)), revolution_arc=F3_T16_ANGLE, mode=Mode.SUBTRACT)

    # F3_s17 → F3_t18 (revolve, cut)
    with BuildSketch(Plane.XZ.offset(-13.225163497)):
        with BuildLine():
            ThreePointArc((-17, 3), (-15.5857864376, 2.4142135624), (-15, 1))
            Line((-15, 1), (-15, 3))
            Line((-15, 3), (-17, 3))
        make_face()
    revolve(axis=Axis((-14, 13.225163497, 3), (0, 0, -1)), revolution_arc=F3_T18_ANGLE, mode=Mode.SUBTRACT)

    # F3_s19 → F3_t20 (revolve, cut)
    with BuildSketch(Plane.YZ.offset(14)):
        with BuildLine():
            ThreePointArc((16.225163497, 3), (14.8109499347, 2.4142135624), (14.225163497, 1))
            Line((14.225163497, 1), (14.225163497, 3))
            Line((14.225163497, 3), (16.225163497, 3))
        make_face()
    revolve(axis=Axis((14, 13.225163497, 3), (0, 0, -1)), revolution_arc=F3_T20_ANGLE, mode=Mode.SUBTRACT)

    # F3_s21 → F3_t22 (revolve, cut)
    with BuildSketch(Plane.XZ.offset(-11.225163497)):
        with BuildLine():
            ThreePointArc((17, 3), (15.5857864376, 2.4142135624), (15, 1))
            Line((15, 1), (15, 3))
            Line((15, 3), (17, 3))
        make_face()
    revolve(axis=Axis((14, 11.225163497, 3), (0, 0, -1)), revolution_arc=F3_T22_ANGLE, mode=Mode.SUBTRACT)

    # F3_s23 → F3_t24 (revolve, cut)
    with BuildSketch(Plane.YZ.offset(-14)):
        with BuildLine():
            ThreePointArc((8.225163497, 3), (9.6393770594, 2.4142135624), (10.225163497, 1))
            Line((10.225163497, 1), (10.225163497, 3))
            Line((10.225163497, 3), (8.225163497, 3))
        make_face()
    revolve(axis=Axis((-14, 11.225163497, 3), (0, 0, -1)), revolution_arc=F3_T24_ANGLE, mode=Mode.SUBTRACT)

    # F3_s25 → F3_t26 (revolve, cut)
    with BuildSketch(Plane.XZ.offset(-7.8213140021)):
        with BuildLine():
            ThreePointArc((-18.2911977172, -1), (-17.7054112796, -2.4142135624), (-16.2911977172, -3))
            Line((-16.2911977172, -3), (-18.2911977172, -3))
            Line((-18.2911977172, -3), (-18.2911977172, -1))
        make_face()
    revolve(axis=Axis((-15.2911977172, 7.8213140021, -3), (0, 0, 1)), revolution_arc=F3_T26_ANGLE, mode=Mode.SUBTRACT)

    # F3_s27 → F3_t28 (revolve, cut)
    with BuildSketch(Plane.YZ.offset(15.2911977172)):
        with BuildLine():
            ThreePointArc((4.8213140021, -1), (5.4071004397, -2.4142135624), (6.8213140021, -3))
            Line((6.8213140021, -3), (4.8213140021, -3))
            Line((4.8213140021, -3), (4.8213140021, -1))
        make_face()
    revolve(axis=Axis((15.2911977172, 7.8213140021, -3), (0, 0, 1)), revolution_arc=F3_T28_ANGLE, mode=Mode.SUBTRACT)

    # F3_s29 → F3_t30 (revolve, cut)
    with BuildSketch(Plane.XZ.offset(-13.3725856692)):
        with BuildLine():
            ThreePointArc((18.2911977172, -1), (17.7054112796, -2.4142135624), (16.2911977172, -3))
            Line((16.2911977172, -3), (18.2911977172, -3))
            Line((18.2911977172, -3), (18.2911977172, -1))
        make_face()
    revolve(axis=Axis((15.2911977172, 13.3725856692, -3), (0, 0, 1)), revolution_arc=F3_T30_ANGLE, mode=Mode.SUBTRACT)

    # F3_s31 → F3_t32 (revolve, cut)
    with BuildSketch(Plane.YZ.offset(-15.2911977172)):
        with BuildLine():
            ThreePointArc((16.3725856692, -1), (15.7867992315, -2.4142135624), (14.3725856692, -3))
            Line((14.3725856692, -3), (16.3725856692, -3))
            Line((16.3725856692, -3), (16.3725856692, -1))
        make_face()
    revolve(axis=Axis((-15.2911977172, 13.3725856692, -3), (0, 0, 1)), revolution_arc=F3_T32_ANGLE, mode=Mode.SUBTRACT)

    # F3_s33 → F3_t34 (revolve, cut)
    with BuildSketch(Plane.XZ.offset(-7.8213140021)):
        with BuildLine():
            ThreePointArc((-18.2911977172, 1), (-17.7054112796, 2.4142135624), (-16.2911977172, 3))
            Line((-16.2911977172, 3), (-18.2911977172, 3))
            Line((-18.2911977172, 3), (-18.2911977172, 1))
        make_face()
    revolve(axis=Axis((-15.2911977172, 7.8213140021, 3), (0, 0, 1)), revolution_arc=F3_T34_ANGLE, mode=Mode.SUBTRACT)

    # F3_s35 → F3_t36 (revolve, cut)
    with BuildSketch(Plane.YZ.offset(15.2911977172)):
        with BuildLine():
            ThreePointArc((6.8213140021, 3), (5.4071004397, 2.4142135624), (4.8213140021, 1))
            Line((4.8213140021, 1), (4.8213140021, 3))
            Line((4.8213140021, 3), (6.8213140021, 3))
        make_face()
    revolve(axis=Axis((15.2911977172, 7.8213140021, 3), (0, 0, 1)), revolution_arc=F3_T36_ANGLE, mode=Mode.SUBTRACT)

    # F3_s37 → F3_t38 (revolve, cut)
    with BuildSketch(Plane.XZ.offset(-13.3725856692)):
        with BuildLine():
            ThreePointArc((18.2911977172, 1), (17.7054112796, 2.4142135624), (16.2911977172, 3))
            Line((16.2911977172, 3), (18.2911977172, 3))
            Line((18.2911977172, 3), (18.2911977172, 1))
        make_face()
    revolve(axis=Axis((15.2911977172, 13.3725856692, 3), (0, 0, 1)), revolution_arc=F3_T38_ANGLE, mode=Mode.SUBTRACT)

    # F3_s39 → F3_t40 (revolve, cut)
    with BuildSketch(Plane.YZ.offset(-15.2911977172)):
        with BuildLine():
            ThreePointArc((16.3725856692, 1), (15.7867992315, 2.4142135624), (14.3725856692, 3))
            Line((14.3725856692, 3), (16.3725856692, 3))
            Line((16.3725856692, 3), (16.3725856692, 1))
        make_face()
    revolve(axis=Axis((-15.2911977172, 13.3725856692, 3), (0, 0, 1)), revolution_arc=F3_T40_ANGLE, mode=Mode.SUBTRACT)


solid = Compound([f1.part, f2.part])
